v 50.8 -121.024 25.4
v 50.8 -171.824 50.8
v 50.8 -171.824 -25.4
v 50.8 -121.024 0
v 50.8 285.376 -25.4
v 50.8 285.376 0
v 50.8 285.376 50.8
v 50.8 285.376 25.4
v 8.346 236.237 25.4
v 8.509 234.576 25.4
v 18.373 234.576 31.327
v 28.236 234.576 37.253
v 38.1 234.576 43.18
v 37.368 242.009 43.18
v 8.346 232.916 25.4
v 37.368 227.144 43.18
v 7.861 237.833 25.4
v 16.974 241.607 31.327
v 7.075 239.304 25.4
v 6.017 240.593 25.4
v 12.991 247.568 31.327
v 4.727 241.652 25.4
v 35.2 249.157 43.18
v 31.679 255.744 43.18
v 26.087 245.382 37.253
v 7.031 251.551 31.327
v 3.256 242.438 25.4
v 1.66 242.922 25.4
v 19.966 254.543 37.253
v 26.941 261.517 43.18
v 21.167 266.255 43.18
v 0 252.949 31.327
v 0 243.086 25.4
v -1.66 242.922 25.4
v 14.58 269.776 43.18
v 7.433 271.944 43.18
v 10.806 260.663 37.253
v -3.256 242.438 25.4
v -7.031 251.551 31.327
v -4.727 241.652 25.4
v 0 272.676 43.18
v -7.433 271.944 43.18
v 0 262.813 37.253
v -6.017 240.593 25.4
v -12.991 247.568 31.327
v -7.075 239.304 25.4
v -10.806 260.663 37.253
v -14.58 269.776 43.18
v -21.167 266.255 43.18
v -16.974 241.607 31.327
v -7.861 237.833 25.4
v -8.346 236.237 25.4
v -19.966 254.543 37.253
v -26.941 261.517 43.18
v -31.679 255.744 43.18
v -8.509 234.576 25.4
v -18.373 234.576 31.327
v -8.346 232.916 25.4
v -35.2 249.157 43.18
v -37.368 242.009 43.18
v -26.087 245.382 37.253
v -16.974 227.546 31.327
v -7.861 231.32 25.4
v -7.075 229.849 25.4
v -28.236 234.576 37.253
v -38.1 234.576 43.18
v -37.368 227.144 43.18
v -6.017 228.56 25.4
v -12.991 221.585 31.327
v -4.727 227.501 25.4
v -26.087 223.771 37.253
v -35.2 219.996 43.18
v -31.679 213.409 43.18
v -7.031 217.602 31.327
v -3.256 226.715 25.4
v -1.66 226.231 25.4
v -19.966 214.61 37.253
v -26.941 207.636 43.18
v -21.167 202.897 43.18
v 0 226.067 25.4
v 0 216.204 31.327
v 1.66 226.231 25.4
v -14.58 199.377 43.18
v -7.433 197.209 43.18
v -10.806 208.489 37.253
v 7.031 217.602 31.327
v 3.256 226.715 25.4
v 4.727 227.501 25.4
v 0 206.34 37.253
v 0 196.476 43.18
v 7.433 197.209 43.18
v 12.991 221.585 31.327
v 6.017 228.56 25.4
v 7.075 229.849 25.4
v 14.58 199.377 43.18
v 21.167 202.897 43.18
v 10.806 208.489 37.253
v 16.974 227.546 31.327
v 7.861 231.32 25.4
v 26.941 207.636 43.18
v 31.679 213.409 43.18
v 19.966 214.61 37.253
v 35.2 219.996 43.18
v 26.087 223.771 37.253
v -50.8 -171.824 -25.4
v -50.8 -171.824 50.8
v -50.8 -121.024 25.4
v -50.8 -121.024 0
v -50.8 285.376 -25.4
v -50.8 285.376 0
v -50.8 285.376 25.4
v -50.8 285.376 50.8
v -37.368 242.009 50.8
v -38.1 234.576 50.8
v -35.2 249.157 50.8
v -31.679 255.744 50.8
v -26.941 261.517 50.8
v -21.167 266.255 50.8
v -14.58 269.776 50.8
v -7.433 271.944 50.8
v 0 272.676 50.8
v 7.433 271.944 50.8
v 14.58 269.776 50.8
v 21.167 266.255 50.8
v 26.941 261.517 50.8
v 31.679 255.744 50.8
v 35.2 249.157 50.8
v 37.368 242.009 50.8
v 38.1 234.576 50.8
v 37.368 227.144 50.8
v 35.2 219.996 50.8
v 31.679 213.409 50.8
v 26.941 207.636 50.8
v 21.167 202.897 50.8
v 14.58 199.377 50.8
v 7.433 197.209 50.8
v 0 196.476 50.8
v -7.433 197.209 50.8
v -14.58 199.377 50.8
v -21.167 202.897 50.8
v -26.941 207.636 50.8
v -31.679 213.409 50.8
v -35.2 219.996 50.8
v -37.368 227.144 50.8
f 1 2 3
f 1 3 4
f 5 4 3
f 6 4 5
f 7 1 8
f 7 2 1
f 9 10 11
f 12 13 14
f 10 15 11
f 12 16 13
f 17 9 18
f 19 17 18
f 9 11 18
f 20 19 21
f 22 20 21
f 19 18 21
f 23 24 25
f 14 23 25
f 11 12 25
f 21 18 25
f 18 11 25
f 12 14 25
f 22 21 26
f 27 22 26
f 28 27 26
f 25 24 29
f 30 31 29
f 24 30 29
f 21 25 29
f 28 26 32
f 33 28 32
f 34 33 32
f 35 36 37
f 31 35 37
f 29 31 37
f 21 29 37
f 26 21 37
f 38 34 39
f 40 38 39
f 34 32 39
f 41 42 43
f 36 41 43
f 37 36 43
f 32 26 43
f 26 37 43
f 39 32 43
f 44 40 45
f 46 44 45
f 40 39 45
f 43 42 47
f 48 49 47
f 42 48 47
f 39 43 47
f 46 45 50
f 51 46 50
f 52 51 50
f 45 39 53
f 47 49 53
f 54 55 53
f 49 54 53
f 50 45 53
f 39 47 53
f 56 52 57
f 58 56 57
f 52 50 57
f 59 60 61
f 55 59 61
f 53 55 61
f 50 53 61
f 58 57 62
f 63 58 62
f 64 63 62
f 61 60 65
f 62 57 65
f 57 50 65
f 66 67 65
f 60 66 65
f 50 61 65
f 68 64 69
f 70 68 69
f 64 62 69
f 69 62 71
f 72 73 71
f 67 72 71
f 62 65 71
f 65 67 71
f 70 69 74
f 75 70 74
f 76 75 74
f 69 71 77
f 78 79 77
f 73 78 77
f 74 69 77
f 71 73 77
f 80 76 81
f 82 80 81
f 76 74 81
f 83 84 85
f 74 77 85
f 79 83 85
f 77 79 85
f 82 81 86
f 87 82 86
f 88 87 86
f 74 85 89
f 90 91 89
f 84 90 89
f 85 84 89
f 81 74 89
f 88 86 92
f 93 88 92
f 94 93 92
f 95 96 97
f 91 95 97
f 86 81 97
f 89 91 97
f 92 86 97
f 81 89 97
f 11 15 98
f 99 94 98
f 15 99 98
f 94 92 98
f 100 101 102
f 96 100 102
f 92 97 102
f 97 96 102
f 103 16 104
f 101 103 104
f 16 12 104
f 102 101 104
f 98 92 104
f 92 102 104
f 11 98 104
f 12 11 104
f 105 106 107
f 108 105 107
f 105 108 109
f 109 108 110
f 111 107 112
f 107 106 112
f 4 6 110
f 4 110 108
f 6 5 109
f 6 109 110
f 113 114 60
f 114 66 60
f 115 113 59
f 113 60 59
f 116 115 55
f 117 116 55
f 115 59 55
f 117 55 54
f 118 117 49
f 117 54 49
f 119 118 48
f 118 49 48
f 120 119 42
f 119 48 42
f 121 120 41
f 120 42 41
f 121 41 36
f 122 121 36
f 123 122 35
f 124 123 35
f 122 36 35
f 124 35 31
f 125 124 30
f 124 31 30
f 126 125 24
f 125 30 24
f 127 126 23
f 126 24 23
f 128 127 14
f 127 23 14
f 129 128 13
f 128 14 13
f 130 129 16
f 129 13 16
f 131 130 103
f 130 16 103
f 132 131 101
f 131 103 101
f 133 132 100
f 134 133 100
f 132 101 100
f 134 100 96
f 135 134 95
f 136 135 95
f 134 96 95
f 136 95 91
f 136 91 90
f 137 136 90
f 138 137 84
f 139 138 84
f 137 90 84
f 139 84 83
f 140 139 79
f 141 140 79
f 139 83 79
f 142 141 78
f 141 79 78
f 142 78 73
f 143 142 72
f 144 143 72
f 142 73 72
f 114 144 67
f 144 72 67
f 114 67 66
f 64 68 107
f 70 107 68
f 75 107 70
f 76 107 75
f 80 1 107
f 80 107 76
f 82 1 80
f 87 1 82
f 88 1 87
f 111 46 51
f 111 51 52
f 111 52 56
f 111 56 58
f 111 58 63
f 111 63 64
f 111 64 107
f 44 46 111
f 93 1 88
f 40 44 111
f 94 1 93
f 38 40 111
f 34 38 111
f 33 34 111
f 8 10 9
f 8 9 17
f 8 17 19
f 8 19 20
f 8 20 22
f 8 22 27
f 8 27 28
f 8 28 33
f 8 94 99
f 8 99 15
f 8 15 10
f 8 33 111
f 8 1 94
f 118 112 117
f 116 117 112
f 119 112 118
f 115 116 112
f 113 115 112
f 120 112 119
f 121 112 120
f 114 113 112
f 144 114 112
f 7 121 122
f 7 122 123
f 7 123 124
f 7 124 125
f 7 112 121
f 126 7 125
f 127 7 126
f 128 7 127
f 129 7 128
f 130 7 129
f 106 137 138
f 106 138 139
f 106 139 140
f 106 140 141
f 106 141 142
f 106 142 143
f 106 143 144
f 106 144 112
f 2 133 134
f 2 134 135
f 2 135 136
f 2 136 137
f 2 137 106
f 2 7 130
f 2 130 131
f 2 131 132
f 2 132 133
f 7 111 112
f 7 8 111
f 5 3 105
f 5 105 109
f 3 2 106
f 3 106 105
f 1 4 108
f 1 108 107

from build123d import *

# Parameters (mm, degrees)
F1_DEPTH = 50.8
F3_D     = 76.2
F3_DEPTH = 7.62
F3_TIP   = 22.892789585


with BuildPart() as f1:
    # F0 (on Right) → F1 (new body, symmetric)
    with BuildSketch(Plane.YZ):
        Polygon((285.3764565342, 50.8), (-171.8235434658, 50.8), (-171.8235434658, -25.4), (285.3764565342, -25.4), (285.3764565342, 0), (-121.0235434658, 0), (-121.0235434658, 25.4), (285.3764565342, 25.4), align=None)
    extrude(amount=F1_DEPTH, both=True)

    # F3
    with Locations(Plane.XY.offset(50.8)):
        with Locations((0, 234.5764565342)):
            Hole(F3_D / 2, depth=F3_DEPTH)
            with Locations((0, 0, -(F3_DEPTH + F3_TIP / 2))):  # 118° drill point
                Cone(0, F3_D / 2, F3_TIP, mode=Mode.SUBTRACT)


solid = f1.part
